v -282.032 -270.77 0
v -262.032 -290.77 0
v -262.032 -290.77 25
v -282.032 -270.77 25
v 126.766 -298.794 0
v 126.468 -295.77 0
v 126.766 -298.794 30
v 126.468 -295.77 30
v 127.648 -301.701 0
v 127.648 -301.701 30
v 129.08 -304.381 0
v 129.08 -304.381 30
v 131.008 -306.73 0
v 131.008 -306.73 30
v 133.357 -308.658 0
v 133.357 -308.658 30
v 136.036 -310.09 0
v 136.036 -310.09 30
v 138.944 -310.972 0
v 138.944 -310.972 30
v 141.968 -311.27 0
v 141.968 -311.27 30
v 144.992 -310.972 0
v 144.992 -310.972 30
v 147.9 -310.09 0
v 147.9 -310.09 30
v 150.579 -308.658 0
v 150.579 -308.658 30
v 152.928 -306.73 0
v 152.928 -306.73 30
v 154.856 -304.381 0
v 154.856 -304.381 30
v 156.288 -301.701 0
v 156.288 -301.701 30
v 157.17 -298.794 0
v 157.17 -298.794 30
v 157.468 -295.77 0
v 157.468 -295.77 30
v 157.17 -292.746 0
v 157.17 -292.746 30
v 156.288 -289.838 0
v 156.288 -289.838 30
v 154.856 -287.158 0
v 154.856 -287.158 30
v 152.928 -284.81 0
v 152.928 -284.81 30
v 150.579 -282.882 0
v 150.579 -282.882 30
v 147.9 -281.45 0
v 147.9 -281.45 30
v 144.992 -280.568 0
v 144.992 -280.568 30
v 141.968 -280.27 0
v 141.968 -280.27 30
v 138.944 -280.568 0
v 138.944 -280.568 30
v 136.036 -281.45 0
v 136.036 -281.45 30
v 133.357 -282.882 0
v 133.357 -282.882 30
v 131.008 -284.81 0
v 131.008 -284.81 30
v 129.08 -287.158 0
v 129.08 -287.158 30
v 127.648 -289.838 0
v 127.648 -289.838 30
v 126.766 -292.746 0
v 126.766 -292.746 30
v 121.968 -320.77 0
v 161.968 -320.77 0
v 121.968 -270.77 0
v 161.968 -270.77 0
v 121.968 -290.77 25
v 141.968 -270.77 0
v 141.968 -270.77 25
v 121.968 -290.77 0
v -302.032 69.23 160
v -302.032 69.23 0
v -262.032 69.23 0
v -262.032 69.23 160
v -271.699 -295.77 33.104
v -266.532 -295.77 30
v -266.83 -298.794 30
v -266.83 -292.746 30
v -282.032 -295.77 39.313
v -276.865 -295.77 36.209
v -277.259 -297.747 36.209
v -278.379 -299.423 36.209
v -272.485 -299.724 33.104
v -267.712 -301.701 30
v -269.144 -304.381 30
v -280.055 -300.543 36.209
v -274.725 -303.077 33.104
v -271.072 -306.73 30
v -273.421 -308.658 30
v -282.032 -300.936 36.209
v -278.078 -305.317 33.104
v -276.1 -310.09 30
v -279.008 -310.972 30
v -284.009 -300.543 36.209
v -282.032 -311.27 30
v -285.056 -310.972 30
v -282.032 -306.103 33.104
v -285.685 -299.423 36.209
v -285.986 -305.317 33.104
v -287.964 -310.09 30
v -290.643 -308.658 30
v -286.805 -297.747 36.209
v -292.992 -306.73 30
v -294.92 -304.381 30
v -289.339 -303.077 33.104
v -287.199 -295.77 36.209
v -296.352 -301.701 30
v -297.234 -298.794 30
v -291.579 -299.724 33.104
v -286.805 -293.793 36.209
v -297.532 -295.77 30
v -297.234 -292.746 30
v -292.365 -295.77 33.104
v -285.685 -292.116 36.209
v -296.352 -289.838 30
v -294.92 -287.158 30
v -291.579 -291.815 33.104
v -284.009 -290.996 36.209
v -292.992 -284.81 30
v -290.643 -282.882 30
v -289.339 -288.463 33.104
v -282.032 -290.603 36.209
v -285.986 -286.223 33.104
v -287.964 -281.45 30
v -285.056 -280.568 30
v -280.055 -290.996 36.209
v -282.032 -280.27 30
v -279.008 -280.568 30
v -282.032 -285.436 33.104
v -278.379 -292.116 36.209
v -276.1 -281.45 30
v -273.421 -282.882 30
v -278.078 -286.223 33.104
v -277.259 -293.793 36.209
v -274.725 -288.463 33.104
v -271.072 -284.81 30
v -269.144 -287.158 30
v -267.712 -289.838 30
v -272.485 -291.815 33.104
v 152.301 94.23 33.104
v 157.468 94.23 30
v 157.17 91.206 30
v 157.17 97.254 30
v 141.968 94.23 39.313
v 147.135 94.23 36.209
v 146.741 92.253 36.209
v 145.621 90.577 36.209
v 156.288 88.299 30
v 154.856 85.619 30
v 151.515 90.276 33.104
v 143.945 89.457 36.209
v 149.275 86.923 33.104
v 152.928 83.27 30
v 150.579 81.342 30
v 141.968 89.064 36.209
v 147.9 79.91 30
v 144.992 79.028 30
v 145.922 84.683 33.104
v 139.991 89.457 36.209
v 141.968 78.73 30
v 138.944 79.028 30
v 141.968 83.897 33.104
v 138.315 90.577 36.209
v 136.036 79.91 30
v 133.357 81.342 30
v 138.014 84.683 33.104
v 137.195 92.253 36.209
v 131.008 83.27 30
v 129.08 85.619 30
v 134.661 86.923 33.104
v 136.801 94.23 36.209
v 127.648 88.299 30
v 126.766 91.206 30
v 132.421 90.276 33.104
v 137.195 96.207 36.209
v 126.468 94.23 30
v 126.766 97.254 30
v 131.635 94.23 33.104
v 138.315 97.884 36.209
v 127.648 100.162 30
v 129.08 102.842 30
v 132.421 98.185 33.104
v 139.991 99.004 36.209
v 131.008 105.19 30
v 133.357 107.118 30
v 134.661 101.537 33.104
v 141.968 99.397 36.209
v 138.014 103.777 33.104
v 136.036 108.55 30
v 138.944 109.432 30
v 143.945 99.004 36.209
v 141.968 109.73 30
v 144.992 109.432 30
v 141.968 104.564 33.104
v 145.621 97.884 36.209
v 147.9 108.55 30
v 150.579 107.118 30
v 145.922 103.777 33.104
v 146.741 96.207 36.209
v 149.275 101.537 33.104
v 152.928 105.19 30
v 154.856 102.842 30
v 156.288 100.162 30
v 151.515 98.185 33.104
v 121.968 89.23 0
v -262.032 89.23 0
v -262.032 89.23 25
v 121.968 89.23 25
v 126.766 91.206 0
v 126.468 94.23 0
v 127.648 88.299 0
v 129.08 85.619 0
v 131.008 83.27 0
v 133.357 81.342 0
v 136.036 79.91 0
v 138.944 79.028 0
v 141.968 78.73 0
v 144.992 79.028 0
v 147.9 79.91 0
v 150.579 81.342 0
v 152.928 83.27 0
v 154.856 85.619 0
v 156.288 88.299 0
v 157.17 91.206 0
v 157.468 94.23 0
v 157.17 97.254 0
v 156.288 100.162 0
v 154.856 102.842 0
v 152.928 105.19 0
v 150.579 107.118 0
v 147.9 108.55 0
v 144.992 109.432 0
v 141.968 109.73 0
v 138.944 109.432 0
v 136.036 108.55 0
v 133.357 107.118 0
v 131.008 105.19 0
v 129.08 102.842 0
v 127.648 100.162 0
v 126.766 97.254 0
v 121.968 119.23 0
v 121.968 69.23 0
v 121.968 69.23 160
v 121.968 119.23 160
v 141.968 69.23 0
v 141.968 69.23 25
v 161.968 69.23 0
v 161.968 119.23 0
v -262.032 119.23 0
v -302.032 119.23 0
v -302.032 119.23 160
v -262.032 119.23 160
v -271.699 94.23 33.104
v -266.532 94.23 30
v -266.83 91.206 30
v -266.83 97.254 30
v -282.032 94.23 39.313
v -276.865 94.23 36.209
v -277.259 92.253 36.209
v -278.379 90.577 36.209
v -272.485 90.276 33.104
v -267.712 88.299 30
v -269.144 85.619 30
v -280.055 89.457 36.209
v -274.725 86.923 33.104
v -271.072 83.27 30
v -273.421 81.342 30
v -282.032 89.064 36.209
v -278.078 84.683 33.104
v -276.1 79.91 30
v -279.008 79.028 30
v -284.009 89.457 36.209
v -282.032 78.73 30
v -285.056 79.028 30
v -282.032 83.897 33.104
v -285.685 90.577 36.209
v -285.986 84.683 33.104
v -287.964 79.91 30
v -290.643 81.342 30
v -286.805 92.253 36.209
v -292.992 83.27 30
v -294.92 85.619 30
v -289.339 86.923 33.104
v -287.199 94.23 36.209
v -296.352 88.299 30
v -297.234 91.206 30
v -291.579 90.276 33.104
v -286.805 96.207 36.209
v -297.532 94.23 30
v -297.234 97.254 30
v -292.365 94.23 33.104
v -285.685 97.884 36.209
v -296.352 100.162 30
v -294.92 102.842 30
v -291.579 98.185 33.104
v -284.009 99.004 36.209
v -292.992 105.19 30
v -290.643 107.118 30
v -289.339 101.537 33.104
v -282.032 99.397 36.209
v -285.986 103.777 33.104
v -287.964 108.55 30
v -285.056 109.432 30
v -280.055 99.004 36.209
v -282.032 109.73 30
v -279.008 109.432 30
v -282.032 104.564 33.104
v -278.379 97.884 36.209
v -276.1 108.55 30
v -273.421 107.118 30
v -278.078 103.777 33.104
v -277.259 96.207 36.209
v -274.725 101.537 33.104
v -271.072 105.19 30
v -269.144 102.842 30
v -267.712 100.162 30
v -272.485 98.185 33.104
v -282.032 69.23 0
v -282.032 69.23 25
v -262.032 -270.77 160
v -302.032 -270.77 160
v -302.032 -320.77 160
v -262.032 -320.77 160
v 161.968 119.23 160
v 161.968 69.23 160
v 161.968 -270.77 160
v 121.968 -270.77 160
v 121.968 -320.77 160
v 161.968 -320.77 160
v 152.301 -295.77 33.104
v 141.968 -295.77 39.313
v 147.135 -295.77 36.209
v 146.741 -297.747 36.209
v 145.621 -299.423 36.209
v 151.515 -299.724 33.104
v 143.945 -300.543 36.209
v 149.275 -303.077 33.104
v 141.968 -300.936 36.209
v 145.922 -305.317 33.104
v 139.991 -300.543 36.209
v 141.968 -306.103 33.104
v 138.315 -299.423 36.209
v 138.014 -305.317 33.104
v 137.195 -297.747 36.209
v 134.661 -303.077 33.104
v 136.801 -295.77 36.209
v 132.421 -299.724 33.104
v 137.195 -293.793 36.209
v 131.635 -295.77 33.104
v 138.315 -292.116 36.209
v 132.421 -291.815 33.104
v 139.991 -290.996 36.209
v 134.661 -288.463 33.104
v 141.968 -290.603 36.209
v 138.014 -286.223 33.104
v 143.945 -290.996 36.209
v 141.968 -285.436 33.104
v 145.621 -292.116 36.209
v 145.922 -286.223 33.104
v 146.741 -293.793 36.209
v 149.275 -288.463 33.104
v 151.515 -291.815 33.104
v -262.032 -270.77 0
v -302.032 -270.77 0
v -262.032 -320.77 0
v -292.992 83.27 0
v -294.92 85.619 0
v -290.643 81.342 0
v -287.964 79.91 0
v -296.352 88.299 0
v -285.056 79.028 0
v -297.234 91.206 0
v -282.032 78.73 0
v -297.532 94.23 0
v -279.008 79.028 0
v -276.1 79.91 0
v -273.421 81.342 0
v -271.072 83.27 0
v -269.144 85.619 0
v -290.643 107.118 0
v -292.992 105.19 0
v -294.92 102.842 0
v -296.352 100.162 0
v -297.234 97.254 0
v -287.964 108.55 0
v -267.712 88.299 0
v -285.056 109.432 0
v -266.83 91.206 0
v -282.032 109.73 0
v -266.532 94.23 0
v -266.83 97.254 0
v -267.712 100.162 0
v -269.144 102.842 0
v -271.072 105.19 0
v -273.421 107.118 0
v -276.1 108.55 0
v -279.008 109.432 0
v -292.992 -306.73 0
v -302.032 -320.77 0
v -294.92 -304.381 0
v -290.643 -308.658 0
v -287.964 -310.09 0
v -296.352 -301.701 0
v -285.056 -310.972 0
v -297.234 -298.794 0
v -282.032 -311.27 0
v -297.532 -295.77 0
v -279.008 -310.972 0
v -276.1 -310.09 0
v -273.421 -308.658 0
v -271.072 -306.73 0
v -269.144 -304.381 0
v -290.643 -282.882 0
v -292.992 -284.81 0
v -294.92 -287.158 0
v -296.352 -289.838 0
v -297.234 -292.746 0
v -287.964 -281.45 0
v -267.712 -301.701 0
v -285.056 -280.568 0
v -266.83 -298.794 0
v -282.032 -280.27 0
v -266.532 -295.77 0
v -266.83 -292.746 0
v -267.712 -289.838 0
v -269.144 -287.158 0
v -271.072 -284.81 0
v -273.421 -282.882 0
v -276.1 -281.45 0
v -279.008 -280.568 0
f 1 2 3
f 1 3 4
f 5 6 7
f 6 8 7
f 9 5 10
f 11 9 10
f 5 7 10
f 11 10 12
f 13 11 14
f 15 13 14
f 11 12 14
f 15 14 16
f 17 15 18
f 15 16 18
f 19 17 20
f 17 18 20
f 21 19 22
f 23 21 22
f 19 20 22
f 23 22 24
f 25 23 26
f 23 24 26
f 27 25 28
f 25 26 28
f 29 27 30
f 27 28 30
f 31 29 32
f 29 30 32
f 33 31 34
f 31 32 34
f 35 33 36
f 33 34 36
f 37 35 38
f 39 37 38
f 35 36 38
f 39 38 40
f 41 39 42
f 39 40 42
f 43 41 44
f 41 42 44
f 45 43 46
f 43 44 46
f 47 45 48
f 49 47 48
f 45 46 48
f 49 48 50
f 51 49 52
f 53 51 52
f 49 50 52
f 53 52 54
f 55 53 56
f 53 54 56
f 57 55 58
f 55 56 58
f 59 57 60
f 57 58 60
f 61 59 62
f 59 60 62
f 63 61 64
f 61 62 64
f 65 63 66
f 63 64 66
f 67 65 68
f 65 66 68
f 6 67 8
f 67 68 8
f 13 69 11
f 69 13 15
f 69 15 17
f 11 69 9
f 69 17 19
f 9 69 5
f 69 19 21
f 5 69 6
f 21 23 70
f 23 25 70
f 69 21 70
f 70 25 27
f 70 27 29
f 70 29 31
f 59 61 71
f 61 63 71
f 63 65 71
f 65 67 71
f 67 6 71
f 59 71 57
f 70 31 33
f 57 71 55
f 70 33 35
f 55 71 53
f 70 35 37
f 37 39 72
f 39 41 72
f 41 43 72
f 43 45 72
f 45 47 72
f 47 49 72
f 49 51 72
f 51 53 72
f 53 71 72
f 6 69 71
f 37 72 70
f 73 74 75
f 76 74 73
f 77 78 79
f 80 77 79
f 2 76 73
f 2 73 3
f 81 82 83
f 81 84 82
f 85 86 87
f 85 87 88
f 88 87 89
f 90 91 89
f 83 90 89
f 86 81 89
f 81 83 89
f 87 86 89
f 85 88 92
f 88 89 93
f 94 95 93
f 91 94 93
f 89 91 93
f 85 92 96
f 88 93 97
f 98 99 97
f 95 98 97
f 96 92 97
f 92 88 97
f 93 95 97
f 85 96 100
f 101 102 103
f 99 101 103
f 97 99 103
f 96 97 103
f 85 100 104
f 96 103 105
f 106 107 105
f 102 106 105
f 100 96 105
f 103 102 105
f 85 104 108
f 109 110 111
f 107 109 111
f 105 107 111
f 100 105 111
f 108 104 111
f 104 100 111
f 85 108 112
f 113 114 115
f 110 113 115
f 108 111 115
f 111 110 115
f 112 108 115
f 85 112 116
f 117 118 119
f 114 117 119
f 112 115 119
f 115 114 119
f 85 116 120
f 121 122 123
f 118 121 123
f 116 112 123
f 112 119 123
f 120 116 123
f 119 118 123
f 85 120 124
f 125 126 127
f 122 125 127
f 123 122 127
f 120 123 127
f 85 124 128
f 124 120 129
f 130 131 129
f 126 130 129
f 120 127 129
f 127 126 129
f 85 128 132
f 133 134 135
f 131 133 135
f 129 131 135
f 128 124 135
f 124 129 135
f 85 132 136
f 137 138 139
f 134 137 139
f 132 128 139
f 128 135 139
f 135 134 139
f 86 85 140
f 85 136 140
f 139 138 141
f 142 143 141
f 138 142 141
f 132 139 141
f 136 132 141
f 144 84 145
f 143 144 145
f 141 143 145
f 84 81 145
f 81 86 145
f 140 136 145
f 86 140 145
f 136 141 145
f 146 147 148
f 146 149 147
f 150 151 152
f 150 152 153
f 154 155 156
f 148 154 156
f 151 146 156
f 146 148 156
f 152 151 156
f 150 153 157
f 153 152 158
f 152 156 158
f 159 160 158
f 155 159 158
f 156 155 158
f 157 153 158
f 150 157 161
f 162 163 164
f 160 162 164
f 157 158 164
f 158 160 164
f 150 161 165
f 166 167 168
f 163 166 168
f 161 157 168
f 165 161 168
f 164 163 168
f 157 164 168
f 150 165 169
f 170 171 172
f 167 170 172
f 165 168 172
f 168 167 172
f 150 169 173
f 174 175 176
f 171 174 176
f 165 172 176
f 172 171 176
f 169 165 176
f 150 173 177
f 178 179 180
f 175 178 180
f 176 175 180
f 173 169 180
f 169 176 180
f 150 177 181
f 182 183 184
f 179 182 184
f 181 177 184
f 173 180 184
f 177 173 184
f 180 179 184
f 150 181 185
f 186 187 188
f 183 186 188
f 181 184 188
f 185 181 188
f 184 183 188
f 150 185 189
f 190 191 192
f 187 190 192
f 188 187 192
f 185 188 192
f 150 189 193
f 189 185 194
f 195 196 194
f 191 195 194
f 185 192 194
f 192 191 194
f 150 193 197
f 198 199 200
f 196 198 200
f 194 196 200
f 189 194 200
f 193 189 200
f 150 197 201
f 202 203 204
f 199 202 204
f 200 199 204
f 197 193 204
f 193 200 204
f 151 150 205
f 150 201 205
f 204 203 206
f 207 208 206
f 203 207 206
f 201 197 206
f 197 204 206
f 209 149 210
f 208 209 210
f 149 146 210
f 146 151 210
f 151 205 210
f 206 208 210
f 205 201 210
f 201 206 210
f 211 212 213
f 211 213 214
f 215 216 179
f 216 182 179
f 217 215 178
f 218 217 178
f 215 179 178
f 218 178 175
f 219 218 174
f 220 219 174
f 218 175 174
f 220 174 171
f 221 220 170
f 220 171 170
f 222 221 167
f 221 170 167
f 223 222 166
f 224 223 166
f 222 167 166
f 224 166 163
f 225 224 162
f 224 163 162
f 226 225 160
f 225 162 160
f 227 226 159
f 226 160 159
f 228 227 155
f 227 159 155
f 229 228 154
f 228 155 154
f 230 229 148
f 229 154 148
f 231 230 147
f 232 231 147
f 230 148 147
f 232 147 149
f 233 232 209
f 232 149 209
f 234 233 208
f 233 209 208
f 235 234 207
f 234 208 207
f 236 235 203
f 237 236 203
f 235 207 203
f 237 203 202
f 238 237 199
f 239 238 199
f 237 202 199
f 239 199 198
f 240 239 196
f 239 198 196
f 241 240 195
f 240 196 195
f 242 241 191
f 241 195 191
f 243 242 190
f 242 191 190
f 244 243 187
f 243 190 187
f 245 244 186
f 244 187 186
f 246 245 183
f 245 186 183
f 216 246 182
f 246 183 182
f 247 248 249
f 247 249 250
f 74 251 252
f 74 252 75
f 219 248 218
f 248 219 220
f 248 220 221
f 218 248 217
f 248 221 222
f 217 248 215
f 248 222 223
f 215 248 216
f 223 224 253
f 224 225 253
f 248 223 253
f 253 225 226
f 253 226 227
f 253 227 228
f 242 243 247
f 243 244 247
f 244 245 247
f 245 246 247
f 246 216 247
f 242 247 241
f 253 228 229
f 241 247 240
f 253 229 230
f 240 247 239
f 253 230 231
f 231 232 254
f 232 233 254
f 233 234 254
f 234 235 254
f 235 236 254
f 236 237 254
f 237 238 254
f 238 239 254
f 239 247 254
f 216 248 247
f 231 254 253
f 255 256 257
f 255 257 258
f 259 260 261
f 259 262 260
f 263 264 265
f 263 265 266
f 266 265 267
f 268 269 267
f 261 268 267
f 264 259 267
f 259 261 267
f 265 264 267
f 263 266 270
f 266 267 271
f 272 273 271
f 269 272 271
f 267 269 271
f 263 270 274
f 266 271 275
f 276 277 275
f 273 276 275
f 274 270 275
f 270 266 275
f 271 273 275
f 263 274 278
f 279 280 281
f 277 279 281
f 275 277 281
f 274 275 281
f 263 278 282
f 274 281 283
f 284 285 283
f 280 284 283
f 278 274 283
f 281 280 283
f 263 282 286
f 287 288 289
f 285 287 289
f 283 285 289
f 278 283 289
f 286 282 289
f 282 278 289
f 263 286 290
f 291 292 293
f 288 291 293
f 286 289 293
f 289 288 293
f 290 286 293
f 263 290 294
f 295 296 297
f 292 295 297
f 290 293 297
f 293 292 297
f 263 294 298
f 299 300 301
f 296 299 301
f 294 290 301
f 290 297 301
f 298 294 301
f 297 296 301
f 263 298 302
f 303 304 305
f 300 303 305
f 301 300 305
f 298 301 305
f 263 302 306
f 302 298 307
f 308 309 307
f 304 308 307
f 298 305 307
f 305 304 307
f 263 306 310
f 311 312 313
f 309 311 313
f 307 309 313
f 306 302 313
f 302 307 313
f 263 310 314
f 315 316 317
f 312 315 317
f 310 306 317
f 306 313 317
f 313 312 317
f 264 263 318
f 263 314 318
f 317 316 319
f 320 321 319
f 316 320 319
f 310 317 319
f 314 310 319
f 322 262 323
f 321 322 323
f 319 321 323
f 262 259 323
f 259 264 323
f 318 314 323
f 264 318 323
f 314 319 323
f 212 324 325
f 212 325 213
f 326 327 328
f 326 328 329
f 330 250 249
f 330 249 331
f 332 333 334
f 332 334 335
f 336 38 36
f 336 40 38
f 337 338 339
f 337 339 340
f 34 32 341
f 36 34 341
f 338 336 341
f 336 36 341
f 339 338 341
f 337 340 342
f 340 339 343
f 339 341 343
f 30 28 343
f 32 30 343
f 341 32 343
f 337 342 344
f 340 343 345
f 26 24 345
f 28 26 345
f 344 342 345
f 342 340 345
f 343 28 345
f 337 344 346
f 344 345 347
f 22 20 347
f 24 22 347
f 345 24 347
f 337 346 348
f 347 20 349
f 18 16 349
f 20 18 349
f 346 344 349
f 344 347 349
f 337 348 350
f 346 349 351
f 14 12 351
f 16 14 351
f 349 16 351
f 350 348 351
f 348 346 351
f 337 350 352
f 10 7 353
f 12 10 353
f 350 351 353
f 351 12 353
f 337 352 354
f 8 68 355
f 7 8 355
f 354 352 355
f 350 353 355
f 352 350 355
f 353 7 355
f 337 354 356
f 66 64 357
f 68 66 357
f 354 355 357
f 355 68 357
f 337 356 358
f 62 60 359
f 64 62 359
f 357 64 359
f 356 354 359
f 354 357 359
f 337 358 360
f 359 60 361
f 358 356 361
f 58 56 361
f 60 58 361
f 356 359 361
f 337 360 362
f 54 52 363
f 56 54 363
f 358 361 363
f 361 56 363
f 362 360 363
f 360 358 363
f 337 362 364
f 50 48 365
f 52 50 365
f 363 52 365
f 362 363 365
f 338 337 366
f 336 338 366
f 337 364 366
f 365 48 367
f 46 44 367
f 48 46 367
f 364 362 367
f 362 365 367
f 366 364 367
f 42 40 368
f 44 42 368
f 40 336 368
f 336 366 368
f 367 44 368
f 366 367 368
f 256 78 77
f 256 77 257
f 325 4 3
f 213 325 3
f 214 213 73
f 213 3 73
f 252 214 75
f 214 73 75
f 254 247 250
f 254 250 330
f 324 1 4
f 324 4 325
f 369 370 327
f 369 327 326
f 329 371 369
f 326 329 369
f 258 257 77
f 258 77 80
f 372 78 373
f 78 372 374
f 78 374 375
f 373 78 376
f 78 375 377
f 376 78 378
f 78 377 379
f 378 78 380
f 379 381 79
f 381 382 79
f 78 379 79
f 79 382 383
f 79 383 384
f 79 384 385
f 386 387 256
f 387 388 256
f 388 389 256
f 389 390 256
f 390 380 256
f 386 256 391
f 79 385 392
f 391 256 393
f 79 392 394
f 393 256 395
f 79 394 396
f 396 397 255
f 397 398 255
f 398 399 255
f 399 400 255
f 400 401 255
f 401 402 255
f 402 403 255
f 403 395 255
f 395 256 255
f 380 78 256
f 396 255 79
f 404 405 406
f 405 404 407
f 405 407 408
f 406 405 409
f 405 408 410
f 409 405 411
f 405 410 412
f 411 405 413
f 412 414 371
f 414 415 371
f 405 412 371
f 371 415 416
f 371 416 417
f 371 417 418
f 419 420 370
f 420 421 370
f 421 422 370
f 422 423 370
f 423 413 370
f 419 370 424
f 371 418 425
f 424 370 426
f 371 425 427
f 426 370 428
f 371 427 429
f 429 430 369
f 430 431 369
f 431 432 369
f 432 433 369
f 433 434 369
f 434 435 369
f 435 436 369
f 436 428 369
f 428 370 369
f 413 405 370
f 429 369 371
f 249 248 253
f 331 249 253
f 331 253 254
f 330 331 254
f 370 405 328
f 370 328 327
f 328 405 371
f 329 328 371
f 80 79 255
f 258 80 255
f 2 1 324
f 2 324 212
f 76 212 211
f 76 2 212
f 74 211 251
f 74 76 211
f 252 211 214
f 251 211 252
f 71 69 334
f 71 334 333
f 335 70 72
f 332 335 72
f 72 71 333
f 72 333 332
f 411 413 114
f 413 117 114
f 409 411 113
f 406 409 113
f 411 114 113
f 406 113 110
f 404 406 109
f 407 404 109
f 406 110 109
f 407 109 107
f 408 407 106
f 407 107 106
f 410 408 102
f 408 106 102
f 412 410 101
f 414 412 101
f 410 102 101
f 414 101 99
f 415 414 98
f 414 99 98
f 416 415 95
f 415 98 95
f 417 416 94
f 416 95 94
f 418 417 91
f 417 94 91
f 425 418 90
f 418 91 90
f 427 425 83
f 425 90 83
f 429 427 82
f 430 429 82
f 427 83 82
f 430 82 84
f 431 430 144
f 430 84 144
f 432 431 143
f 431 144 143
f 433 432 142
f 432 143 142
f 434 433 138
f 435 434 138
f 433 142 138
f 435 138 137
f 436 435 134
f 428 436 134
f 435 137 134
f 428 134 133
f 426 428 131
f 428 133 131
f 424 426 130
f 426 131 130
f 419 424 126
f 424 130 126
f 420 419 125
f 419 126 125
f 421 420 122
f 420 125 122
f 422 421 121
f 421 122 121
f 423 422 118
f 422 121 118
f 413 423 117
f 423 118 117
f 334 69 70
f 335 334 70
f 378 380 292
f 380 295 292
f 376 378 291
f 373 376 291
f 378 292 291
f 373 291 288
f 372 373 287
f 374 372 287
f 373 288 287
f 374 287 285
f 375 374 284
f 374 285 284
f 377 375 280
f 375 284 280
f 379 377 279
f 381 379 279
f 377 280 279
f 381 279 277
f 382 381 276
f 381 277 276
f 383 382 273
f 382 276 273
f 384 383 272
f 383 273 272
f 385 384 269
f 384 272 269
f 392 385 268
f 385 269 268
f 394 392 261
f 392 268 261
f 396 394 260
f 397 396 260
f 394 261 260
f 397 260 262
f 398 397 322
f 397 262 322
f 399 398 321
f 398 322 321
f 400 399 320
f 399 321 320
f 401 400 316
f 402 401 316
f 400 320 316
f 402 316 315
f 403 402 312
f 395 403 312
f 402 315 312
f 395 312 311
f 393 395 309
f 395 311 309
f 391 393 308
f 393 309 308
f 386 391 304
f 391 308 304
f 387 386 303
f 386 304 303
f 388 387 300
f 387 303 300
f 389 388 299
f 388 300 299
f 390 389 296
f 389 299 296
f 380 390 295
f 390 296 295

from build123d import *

# Parameters (mm, degrees)
F1_W       = 40
F1_H       = 50
F2_DEPTH   = 160
F4_D       = 31
F4_DEPTH   = 30
F4_TIP     = 9.3133395949
F4_2_D     = 31
F4_2_DEPTH = 30
F4_2_TIP   = 9.3133395949
F4_3_D     = 31
F4_3_DEPTH = 30
F4_3_TIP   = 9.3133395949
F4_4_D     = 31
F4_4_DEPTH = 30
F4_4_TIP   = 9.3133395949
F6_DEPTH   = 25


with BuildPart() as f2:
    # F1 (on Top) → F2 (new body)
    with BuildSketch(Plane.XY):
        with Locations((-282.0319264125, 94.2301812497)):
            Rectangle(F1_W, F1_H)
    extrude(amount=F2_DEPTH)

    # F4
    with Locations(Plane(origin=(0, 0, 0), x_dir=(1, 0, 0), z_dir=(0, 0, -1))):
        with Locations((-282.0319264125, 295.7698187503), (-282.0319264125, -94.2301812497), (141.9680735875, -94.2301812497), (141.9680735875, 295.7698187503)):
            Hole(F4_D / 2, depth=F4_DEPTH)
            with Locations((0, 0, -(F4_DEPTH + F4_TIP / 2))):  # 118° drill point
                Cone(0, F4_D / 2, F4_TIP, mode=Mode.SUBTRACT)


with BuildPart() as f2b:
    # F1 (on Top) → F2, piece 2 (new body)
    with BuildSketch(Plane.XY):
        with Locations((141.9680735875, 94.2301812497)):
            Rectangle(F1_W, F1_H)
    extrude(amount=F2_DEPTH)

    # F4#2
    with Locations(Plane(origin=(0, 0, 0), x_dir=(1, 0, 0), z_dir=(0, 0, -1))):
        with Locations((-282.0319264125, 295.7698187503), (-282.0319264125, -94.2301812497), (141.9680735875, -94.2301812497), (141.9680735875, 295.7698187503)):
            Hole(F4_2_D / 2, depth=F4_2_DEPTH)
            with Locations((0, 0, -(F4_2_DEPTH + F4_2_TIP / 2))):  # 118° drill point
                Cone(0, F4_2_D / 2, F4_2_TIP, mode=Mode.SUBTRACT)


with BuildPart() as f2c:
    # F1 (on Top) → F2, piece 3 (new body)
    with BuildSketch(Plane.XY):
        with Locations((141.9680735875, -295.7698187503)):
            Rectangle(F1_W, F1_H)
    extrude(amount=F2_DEPTH)

    # F4#3
    with Locations(Plane(origin=(0, 0, 0), x_dir=(1, 0, 0), z_dir=(0, 0, -1))):
        with Locations((-282.0319264125, 295.7698187503), (-282.0319264125, -94.2301812497), (141.9680735875, -94.2301812497), (141.9680735875, 295.7698187503)):
            Hole(F4_3_D / 2, depth=F4_3_DEPTH)
            with Locations((0, 0, -(F4_3_DEPTH + F4_3_TIP / 2))):  # 118° drill point
                Cone(0, F4_3_D / 2, F4_3_TIP, mode=Mode.SUBTRACT)


with BuildPart() as f2d:
    # F1 (on Top) → F2, piece 4 (new body)
    with BuildSketch(Plane.XY):
        with Locations((-282.0319264125, -295.7698187503)):
            Rectangle(F1_W, F1_H)
    extrude(amount=F2_DEPTH)

    # F4#4
    with Locations(Plane(origin=(0, 0, 0), x_dir=(1, 0, 0), z_dir=(0, 0, -1))):
        with Locations((-282.0319264125, 295.7698187503), (-282.0319264125, -94.2301812497), (141.9680735875, -94.2301812497), (141.9680735875, 295.7698187503)):
            Hole(F4_4_D / 2, depth=F4_4_DEPTH)
            with Locations((0, 0, -(F4_4_DEPTH + F4_4_TIP / 2))):  # 118° drill point
                Cone(0, F4_4_D / 2, F4_4_TIP, mode=Mode.SUBTRACT)


with BuildPart() as f6:
    # F5 (on face) → F6 (new body)
    with BuildSketch(Plane(origin=(0, 0, 0), x_dir=(1, 0, 0), z_dir=(0, 0, -1))):
        Polygon((-262.0319264125, 290.7698187503), (-282.0319264125, 270.7698187503), (-262.0319264125, 270.7698187503), align=None)
        Polygon((-262.0319264125, 270.7698187503), (-282.0319264125, 270.7698187503), (-282.0319264125, -69.2301812497), (-262.0319264125, -69.2301812497), (-262.0319264125, -89.2301812497), (121.9680735875, -89.2301812497), (121.9680735875, -69.2301812497), (141.9680735875, -69.2301812497), (141.9680735875, 270.7698187503), (121.9680735875, 270.7698187503), (121.9680735875, 290.7698187503), (-262.0319264125, 290.7698187503), align=None)
        Polygon((-262.0319264125, -69.2301812497), (-282.0319264125, -69.2301812497), (-262.0319264125, -89.2301812497), align=None)
        Polygon((141.9680735875, 270.7698187503), (121.9680735875, 290.7698187503), (121.9680735875, 270.7698187503), align=None)
        Polygon((121.9680735875, -69.2301812497), (121.9680735875, -89.2301812497), (141.9680735875, -69.2301812497), align=None)
    extrude(amount=-F6_DEPTH)


solid = Compound([f2.part, f2b.part, f2c.part, f2d.part, f6.part])
